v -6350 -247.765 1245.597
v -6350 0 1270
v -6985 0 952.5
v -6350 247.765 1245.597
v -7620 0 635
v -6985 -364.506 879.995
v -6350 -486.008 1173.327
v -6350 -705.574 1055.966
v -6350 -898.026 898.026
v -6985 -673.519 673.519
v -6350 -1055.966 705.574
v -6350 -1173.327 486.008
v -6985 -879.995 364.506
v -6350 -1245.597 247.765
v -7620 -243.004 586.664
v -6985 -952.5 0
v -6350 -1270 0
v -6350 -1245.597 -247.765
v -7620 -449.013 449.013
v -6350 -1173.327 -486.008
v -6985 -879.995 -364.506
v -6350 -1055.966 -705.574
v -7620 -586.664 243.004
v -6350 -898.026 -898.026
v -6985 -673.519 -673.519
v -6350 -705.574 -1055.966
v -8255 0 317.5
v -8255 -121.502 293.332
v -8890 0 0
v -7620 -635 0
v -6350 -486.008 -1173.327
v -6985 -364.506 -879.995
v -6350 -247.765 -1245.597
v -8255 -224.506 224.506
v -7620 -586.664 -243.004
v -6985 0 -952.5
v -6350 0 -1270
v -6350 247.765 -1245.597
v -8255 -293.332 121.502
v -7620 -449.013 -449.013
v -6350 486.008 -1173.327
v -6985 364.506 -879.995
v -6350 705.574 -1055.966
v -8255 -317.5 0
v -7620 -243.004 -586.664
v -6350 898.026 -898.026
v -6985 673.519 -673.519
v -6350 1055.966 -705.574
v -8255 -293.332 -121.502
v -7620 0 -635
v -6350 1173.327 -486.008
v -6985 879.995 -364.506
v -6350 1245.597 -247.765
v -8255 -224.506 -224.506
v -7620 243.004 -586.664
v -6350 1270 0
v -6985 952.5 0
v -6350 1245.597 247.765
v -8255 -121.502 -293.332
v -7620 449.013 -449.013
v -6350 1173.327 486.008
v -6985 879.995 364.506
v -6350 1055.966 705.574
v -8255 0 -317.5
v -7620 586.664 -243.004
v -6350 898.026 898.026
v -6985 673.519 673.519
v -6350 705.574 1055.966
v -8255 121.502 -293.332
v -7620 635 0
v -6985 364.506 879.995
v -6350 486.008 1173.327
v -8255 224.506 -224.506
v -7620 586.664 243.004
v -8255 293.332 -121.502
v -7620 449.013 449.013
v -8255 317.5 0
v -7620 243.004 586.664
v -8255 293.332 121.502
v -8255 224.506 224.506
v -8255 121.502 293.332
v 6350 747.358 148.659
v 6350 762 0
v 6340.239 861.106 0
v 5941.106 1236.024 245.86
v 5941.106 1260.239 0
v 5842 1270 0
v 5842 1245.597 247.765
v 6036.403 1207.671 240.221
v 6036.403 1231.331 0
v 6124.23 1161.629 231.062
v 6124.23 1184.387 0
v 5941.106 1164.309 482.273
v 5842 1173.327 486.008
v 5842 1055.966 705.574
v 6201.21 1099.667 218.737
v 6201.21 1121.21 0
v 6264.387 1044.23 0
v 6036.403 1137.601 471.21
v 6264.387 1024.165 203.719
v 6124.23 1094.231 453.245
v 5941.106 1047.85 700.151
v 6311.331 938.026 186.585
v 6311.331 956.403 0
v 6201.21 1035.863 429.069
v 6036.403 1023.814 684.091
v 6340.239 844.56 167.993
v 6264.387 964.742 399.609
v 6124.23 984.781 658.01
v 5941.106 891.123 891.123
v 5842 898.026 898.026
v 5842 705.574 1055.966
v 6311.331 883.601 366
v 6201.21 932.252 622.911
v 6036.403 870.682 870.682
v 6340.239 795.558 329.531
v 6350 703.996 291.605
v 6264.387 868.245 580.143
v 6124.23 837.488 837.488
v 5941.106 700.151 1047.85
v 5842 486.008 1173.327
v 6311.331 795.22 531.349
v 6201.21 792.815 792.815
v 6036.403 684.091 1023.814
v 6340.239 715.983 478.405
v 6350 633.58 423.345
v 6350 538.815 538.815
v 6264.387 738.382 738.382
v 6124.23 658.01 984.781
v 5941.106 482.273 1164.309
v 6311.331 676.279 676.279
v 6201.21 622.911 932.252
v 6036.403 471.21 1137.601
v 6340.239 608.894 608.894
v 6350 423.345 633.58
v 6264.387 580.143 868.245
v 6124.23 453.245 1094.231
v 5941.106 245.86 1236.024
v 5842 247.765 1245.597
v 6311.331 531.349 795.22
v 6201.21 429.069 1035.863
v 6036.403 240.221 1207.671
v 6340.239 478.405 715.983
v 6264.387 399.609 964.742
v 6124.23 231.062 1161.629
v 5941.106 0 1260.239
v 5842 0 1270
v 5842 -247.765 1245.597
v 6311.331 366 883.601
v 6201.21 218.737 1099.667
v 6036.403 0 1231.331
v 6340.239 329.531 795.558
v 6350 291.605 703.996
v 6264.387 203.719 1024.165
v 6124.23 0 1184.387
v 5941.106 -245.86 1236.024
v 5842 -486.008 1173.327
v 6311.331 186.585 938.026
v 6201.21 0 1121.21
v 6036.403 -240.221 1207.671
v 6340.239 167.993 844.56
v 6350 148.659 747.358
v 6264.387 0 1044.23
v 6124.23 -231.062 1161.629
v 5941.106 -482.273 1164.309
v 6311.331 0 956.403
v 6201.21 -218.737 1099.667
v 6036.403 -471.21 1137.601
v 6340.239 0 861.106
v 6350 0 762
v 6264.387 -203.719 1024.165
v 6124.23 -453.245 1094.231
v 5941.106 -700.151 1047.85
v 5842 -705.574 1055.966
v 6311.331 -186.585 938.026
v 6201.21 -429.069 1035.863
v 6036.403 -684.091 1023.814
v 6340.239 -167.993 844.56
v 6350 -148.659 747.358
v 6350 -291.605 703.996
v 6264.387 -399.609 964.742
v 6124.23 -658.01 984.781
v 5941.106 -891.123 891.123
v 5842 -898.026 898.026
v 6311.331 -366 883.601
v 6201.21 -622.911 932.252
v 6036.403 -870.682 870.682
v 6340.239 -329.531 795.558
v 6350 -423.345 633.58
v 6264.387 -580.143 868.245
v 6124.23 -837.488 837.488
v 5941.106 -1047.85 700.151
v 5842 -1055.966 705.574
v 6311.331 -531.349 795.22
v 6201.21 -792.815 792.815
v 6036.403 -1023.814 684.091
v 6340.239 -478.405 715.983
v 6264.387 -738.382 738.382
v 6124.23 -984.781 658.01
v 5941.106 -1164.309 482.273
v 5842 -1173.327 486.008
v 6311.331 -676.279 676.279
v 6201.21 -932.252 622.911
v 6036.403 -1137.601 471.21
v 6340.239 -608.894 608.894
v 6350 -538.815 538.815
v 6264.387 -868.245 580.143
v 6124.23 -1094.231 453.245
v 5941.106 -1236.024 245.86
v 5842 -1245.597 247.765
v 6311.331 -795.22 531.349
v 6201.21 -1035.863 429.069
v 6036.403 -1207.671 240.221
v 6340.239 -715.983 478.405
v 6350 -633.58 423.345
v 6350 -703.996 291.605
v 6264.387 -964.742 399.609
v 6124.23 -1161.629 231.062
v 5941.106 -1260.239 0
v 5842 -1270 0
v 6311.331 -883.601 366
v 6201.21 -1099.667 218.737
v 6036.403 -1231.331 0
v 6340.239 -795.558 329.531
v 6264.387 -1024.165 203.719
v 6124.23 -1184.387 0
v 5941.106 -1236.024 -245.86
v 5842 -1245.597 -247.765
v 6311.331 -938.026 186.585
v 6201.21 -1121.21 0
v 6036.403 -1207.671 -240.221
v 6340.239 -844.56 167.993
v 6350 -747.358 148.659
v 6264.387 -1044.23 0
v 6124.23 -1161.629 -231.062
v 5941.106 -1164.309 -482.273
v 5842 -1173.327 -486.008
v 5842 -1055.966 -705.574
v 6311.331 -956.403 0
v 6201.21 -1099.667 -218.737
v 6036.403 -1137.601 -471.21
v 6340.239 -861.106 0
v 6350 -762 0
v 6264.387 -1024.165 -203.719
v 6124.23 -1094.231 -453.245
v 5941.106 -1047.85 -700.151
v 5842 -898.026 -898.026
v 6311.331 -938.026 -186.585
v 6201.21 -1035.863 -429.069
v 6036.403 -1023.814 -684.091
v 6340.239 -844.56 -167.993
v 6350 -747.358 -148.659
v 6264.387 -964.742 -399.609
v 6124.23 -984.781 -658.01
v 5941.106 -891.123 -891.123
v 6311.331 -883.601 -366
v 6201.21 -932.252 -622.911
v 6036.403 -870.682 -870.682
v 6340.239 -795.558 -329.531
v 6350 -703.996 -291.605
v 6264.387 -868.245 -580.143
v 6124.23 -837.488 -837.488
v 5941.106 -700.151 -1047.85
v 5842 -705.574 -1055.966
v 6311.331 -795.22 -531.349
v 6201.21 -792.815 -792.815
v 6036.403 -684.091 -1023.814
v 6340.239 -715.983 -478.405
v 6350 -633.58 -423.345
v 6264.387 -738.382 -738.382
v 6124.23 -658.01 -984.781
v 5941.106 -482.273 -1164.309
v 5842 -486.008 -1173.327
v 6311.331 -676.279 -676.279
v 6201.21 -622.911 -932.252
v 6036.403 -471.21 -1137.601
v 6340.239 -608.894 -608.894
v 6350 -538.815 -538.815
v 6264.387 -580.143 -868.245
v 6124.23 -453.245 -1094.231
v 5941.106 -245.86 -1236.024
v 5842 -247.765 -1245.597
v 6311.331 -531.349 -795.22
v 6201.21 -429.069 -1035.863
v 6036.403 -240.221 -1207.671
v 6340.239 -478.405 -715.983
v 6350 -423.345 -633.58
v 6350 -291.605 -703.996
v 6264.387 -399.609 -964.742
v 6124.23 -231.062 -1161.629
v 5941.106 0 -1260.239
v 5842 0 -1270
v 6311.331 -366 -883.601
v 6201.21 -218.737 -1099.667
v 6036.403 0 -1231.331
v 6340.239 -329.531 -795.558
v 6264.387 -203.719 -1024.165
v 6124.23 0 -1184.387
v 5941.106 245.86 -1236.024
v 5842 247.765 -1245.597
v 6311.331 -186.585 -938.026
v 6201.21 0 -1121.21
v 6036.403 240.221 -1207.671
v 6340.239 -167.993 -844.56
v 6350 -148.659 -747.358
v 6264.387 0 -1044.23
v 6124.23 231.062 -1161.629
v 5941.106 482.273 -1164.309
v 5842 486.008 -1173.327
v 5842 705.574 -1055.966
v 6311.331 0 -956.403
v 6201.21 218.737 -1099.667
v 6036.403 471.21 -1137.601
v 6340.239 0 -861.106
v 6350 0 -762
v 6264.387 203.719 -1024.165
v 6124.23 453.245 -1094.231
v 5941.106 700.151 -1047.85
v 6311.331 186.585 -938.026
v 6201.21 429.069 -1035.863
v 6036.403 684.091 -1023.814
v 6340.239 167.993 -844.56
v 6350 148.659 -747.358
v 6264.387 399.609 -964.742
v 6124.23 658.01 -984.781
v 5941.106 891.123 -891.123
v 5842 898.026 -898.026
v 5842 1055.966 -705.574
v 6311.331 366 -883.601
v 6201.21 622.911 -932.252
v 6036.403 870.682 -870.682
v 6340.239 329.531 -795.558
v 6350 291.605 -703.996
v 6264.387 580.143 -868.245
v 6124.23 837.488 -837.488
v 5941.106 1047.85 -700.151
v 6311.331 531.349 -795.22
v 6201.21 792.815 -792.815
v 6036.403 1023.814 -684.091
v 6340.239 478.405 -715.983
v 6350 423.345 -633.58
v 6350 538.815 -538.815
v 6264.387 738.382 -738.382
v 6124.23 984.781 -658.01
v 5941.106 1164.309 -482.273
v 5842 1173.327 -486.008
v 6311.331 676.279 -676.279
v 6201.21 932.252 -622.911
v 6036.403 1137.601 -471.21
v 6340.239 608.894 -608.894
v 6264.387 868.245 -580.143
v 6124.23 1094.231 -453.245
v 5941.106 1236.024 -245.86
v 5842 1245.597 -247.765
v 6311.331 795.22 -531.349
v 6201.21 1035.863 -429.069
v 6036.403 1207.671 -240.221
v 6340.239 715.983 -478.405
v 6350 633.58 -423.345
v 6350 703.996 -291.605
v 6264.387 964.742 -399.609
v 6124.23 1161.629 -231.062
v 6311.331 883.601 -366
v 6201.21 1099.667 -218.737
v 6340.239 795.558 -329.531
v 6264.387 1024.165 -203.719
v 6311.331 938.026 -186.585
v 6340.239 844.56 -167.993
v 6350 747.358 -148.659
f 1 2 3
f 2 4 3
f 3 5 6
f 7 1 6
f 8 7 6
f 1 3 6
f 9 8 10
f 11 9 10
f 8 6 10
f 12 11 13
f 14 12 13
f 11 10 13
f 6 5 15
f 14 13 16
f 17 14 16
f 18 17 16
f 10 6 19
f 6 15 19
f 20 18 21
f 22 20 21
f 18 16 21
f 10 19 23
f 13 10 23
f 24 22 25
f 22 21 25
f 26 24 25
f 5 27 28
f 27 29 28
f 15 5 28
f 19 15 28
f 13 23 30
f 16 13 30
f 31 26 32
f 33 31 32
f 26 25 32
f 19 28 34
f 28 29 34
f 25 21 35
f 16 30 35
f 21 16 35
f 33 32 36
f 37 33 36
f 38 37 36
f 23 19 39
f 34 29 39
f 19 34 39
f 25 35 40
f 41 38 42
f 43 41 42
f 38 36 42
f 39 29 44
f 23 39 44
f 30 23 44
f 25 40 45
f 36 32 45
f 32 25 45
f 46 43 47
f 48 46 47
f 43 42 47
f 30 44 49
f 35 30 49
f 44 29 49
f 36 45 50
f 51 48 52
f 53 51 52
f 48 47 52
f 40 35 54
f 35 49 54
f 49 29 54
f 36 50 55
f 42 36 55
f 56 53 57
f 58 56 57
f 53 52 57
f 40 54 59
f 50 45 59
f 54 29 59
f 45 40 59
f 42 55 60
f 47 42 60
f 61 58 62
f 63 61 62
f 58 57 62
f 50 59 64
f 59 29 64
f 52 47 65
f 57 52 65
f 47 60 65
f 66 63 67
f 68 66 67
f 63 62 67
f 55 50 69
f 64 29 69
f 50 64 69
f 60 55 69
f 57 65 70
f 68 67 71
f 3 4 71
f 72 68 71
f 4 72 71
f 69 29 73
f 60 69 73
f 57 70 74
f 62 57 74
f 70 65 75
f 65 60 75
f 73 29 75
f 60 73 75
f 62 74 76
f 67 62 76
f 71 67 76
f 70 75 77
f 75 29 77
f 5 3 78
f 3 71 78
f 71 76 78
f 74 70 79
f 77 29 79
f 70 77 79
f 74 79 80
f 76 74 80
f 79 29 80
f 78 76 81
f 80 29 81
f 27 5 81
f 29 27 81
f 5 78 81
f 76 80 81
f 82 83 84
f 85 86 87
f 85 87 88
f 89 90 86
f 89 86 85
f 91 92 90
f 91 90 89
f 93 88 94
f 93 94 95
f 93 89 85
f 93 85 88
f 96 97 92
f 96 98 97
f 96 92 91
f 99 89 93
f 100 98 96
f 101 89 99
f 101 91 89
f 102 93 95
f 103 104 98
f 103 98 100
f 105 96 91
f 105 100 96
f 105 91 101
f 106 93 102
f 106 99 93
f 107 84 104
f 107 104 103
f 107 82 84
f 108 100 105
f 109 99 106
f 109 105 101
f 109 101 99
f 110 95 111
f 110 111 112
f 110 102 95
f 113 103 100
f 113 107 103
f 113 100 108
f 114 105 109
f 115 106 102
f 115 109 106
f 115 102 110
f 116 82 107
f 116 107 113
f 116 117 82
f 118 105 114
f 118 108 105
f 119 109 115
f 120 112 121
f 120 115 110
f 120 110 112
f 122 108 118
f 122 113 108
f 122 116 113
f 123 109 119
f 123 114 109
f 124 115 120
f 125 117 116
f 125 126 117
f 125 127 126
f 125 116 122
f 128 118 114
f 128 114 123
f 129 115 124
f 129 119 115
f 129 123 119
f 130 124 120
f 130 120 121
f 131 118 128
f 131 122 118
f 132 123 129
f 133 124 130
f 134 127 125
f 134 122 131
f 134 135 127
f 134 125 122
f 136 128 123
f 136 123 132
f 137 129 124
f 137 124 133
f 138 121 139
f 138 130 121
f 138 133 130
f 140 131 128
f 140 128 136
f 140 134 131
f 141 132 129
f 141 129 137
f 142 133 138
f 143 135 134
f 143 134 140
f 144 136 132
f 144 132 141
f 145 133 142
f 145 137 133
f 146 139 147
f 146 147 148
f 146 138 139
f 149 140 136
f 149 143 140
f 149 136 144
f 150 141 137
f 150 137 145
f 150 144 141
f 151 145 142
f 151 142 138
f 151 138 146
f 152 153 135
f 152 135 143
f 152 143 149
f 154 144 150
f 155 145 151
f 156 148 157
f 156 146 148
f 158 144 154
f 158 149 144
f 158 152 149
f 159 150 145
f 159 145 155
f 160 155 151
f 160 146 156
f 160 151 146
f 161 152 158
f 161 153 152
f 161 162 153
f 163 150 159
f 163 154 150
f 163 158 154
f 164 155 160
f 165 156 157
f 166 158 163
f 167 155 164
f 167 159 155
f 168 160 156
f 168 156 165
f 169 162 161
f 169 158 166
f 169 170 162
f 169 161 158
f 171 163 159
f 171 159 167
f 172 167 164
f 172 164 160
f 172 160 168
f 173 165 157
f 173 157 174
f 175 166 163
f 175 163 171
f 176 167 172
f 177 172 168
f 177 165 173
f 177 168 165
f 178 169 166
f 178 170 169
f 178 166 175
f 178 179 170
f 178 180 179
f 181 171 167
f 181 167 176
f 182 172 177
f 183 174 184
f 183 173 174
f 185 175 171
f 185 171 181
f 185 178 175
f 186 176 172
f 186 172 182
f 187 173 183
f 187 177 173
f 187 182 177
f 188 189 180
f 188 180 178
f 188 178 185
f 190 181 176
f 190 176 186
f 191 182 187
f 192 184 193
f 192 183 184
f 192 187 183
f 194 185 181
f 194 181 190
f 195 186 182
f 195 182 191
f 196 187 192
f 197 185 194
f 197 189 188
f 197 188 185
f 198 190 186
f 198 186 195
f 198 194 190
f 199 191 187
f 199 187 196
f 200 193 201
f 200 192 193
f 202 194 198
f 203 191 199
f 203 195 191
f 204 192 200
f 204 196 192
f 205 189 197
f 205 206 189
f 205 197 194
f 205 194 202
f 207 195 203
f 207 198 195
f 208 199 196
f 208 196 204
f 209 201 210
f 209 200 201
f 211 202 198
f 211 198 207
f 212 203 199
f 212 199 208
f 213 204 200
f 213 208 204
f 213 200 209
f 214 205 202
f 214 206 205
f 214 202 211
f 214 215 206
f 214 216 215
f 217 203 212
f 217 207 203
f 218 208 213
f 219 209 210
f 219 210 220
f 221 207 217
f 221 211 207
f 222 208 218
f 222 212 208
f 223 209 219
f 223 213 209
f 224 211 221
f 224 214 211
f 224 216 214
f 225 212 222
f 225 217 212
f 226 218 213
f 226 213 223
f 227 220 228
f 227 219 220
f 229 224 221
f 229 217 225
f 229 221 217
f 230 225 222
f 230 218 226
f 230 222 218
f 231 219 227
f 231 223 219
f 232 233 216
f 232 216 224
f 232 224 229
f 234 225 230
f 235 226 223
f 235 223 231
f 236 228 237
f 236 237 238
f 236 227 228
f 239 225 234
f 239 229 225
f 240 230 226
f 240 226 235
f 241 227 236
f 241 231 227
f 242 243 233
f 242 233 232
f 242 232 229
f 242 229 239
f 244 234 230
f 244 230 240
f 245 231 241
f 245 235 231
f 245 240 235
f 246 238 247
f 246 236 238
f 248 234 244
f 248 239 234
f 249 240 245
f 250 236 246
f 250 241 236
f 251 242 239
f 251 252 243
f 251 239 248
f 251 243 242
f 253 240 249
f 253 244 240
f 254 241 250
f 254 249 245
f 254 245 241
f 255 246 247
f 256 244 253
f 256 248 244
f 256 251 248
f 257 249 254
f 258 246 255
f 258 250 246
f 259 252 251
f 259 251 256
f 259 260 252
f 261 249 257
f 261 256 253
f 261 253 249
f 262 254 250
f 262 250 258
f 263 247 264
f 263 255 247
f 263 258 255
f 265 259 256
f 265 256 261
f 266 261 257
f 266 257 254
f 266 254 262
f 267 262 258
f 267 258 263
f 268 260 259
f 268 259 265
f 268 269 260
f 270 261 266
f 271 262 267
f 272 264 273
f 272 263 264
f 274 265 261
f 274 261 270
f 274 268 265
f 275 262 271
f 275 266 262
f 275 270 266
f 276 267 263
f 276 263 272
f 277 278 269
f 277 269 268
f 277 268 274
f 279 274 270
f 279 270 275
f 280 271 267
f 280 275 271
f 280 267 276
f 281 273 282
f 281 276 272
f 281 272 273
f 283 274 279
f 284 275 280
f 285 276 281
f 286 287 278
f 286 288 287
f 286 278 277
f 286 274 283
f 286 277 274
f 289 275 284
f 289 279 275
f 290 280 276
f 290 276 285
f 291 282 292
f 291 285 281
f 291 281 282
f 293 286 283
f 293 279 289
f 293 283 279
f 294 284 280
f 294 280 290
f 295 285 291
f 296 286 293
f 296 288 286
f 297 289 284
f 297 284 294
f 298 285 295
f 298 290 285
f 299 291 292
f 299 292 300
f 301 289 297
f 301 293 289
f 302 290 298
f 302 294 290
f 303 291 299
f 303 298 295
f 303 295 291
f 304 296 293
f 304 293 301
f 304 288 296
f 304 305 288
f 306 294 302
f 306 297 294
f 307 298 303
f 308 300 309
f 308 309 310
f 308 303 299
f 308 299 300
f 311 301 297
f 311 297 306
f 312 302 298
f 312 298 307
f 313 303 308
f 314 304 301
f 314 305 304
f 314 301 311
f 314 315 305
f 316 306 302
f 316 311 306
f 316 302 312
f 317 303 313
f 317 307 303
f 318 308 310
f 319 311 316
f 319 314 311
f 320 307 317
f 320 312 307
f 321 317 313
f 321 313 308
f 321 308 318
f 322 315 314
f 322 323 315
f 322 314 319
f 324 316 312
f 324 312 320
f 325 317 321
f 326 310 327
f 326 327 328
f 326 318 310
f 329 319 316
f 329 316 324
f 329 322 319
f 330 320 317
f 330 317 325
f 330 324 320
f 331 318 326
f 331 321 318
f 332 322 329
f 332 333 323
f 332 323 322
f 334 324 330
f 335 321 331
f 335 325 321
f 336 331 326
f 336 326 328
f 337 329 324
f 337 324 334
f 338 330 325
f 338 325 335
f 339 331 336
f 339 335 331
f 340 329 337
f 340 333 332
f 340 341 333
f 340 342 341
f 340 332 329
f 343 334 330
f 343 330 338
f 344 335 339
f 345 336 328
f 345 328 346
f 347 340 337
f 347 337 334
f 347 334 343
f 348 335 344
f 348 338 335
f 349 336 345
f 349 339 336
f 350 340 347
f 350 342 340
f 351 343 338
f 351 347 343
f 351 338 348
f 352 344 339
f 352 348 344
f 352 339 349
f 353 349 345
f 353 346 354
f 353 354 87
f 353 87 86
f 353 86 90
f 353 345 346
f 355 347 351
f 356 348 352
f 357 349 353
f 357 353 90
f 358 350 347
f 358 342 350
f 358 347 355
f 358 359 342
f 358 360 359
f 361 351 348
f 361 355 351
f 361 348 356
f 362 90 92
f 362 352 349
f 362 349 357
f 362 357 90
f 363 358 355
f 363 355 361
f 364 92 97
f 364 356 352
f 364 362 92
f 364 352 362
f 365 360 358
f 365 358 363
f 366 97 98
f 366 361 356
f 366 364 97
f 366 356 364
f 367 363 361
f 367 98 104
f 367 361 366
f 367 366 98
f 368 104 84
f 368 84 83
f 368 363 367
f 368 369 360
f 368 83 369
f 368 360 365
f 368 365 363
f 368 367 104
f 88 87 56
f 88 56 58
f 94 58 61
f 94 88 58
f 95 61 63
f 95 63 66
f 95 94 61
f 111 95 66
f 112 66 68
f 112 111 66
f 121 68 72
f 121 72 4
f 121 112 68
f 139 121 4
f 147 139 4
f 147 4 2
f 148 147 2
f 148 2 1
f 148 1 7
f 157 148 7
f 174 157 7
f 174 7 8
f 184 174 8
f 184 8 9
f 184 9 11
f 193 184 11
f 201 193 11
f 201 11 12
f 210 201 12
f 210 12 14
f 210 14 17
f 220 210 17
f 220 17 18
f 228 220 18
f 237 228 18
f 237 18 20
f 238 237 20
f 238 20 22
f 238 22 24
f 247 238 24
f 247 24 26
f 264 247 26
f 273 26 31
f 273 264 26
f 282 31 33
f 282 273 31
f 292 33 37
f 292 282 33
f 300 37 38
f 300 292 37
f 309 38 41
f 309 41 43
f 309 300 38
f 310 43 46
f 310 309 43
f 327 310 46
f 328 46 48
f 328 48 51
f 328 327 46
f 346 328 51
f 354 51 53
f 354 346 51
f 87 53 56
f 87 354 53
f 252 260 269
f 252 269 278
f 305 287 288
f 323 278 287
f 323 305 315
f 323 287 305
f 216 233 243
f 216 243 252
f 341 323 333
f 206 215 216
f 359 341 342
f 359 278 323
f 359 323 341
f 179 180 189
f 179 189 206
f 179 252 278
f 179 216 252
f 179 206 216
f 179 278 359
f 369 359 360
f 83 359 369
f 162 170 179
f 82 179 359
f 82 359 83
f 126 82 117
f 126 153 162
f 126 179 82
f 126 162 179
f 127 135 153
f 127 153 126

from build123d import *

# Parameters (mm, degrees)
F0_R     = 1270
F1_DEPTH = 6350
F2_R     = 508


with BuildPart() as f1:
    # F0 (on Right) → F1 (new body, symmetric)
    with BuildSketch(Plane.YZ):
        Circle(F0_R)
    extrude(amount=F1_DEPTH, both=True)

    # F2
    f2_edges = [f1.edges().sort_by_distance(p)[0] for p in [
        (6350, -1270, 0),
    ]]
    fillet(f2_edges, radius=F2_R)

    # F3 (on Front) → F4 (revolve)
    with BuildSketch(Plane.XZ):
        Polygon((-6350, 0), (-6350, 1270), (-8890, 0), align=None)
    revolve(axis=Axis((-7620, 0, 0), (1, 0, 0)))


solid = f1.part
